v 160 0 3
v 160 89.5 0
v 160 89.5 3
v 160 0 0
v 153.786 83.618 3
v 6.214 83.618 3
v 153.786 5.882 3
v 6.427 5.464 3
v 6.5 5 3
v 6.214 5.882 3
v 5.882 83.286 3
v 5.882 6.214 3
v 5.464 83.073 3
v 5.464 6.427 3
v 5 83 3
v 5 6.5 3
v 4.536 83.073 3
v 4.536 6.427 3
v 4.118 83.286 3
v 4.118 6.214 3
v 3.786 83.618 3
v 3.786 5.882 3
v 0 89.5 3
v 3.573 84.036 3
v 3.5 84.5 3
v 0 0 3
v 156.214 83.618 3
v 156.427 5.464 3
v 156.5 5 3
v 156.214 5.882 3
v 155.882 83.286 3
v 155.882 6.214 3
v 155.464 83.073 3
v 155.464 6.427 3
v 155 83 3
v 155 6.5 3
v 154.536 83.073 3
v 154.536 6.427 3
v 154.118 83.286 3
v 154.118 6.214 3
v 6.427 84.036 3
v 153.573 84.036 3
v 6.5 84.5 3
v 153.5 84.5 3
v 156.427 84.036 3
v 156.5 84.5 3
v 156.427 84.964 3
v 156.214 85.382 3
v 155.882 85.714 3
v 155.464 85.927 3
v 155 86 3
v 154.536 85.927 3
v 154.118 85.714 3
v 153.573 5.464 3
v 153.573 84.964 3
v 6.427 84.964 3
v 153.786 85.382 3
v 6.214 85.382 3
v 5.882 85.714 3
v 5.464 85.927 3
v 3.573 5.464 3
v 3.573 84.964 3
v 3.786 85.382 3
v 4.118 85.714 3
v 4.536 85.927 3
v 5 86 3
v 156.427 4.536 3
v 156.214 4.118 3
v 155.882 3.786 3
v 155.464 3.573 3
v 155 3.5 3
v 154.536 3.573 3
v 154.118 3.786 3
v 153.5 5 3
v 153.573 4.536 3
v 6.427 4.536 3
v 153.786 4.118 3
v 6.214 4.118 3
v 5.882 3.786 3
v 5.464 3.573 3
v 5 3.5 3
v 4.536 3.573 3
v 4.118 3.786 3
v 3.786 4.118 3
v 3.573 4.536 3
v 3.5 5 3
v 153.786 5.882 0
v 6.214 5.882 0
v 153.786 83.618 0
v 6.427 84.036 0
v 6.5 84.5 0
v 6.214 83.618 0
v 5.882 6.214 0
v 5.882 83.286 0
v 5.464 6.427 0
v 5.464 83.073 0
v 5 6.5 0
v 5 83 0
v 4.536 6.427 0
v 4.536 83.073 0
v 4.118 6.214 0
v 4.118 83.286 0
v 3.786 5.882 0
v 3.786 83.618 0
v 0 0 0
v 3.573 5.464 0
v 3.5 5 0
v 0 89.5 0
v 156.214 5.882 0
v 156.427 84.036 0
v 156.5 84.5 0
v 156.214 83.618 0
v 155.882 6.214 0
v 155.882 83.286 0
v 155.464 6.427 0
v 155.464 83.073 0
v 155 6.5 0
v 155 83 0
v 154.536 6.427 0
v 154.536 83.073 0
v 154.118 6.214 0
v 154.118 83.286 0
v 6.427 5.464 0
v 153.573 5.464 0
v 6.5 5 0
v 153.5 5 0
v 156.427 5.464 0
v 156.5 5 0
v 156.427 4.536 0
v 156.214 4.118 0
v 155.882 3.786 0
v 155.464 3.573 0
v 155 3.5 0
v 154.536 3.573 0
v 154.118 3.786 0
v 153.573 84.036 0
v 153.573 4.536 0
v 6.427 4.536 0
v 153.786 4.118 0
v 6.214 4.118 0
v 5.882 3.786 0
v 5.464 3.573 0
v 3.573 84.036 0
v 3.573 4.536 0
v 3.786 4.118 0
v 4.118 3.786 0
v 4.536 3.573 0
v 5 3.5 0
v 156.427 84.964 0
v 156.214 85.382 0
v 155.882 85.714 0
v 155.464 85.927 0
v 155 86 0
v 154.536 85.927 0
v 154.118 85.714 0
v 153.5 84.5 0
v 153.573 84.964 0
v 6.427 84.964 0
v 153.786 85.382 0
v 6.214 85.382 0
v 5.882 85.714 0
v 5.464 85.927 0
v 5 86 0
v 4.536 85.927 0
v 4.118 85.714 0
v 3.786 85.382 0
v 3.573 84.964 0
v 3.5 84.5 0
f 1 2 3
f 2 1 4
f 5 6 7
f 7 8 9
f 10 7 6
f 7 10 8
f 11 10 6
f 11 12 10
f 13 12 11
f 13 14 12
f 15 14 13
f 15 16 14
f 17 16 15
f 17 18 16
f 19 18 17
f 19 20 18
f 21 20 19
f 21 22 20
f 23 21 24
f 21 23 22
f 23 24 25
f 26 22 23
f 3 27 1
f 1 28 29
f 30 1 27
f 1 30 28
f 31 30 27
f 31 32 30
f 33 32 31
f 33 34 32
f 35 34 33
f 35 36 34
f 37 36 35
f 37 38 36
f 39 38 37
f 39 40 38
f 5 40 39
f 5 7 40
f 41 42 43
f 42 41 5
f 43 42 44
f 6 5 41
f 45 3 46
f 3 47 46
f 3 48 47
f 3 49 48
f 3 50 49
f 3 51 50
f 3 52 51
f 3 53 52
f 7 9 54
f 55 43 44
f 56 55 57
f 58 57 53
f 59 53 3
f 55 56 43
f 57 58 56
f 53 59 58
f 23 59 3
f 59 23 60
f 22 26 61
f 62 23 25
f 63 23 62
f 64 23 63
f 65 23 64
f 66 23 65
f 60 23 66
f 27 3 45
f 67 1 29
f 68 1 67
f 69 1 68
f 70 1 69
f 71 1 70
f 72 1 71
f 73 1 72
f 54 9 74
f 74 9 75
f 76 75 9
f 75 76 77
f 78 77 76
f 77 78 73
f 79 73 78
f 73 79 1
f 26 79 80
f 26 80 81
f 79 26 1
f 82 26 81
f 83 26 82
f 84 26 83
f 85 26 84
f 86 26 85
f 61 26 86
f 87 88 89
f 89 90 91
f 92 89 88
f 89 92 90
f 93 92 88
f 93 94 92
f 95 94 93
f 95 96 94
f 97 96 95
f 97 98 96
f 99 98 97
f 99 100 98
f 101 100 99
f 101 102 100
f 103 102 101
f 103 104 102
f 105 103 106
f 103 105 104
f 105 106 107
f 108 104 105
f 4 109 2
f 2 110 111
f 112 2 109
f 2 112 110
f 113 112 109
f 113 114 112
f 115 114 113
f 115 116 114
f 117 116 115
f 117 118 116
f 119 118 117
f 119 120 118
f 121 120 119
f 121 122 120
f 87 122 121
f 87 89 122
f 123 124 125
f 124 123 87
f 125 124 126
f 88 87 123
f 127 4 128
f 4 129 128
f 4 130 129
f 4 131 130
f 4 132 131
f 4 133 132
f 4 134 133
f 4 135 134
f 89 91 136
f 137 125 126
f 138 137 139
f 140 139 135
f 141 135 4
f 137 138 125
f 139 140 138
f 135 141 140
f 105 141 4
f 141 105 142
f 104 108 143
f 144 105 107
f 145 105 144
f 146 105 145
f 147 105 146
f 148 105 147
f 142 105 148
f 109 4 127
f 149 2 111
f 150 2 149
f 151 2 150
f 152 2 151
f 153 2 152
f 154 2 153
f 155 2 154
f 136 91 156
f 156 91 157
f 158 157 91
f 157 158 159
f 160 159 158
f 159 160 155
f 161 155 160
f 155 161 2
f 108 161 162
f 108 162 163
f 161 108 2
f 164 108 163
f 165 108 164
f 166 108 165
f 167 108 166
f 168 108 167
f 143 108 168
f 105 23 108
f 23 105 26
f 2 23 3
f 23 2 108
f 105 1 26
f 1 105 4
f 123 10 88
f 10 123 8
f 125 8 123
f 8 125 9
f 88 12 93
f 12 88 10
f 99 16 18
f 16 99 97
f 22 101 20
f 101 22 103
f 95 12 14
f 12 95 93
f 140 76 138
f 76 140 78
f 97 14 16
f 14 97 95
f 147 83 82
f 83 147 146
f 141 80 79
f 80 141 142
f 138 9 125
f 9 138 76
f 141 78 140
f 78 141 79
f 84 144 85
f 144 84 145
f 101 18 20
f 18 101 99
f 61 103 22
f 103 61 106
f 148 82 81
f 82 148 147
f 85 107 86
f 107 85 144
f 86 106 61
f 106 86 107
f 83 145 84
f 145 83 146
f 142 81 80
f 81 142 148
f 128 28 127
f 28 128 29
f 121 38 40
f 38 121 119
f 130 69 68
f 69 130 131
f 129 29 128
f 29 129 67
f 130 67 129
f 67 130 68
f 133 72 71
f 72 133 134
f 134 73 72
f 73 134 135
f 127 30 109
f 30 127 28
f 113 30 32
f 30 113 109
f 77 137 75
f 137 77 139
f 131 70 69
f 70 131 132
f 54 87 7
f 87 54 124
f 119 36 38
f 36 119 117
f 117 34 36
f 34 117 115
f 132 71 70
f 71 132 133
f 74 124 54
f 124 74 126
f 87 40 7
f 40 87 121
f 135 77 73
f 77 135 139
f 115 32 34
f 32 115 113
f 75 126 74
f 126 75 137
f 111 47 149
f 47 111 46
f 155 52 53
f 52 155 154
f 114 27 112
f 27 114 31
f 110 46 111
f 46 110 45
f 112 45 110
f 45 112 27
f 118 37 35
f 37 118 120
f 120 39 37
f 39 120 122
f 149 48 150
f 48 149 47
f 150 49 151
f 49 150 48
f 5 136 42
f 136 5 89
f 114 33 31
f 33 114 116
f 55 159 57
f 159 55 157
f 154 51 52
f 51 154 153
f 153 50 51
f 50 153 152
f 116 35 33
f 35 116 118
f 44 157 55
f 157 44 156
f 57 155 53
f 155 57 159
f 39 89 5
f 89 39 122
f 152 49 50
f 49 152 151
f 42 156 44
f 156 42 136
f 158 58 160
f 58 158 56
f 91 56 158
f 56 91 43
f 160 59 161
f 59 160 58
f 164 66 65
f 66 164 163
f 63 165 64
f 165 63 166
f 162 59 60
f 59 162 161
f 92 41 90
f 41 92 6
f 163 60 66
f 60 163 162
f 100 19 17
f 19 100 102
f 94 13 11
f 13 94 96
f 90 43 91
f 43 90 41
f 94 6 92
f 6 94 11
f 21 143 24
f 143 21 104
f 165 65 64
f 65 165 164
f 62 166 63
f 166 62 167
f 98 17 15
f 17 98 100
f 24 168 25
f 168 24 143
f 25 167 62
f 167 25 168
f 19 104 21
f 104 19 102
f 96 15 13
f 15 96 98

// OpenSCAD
difference(){
    cube([160,89.5,3]);
    translate([5,5,0]){
        cylinder(d=3, 3, $fn=20);
    }
    translate([155,5,0]){
        cylinder(d=3, 3, $fn=20);
    }
    translate([155,84.5,0]){
        cylinder(d=3, 3, $fn=20);
    }
    translate([5,84.5,0]){
        cylinder(d=3, 3, $fn=20);
    }
}
